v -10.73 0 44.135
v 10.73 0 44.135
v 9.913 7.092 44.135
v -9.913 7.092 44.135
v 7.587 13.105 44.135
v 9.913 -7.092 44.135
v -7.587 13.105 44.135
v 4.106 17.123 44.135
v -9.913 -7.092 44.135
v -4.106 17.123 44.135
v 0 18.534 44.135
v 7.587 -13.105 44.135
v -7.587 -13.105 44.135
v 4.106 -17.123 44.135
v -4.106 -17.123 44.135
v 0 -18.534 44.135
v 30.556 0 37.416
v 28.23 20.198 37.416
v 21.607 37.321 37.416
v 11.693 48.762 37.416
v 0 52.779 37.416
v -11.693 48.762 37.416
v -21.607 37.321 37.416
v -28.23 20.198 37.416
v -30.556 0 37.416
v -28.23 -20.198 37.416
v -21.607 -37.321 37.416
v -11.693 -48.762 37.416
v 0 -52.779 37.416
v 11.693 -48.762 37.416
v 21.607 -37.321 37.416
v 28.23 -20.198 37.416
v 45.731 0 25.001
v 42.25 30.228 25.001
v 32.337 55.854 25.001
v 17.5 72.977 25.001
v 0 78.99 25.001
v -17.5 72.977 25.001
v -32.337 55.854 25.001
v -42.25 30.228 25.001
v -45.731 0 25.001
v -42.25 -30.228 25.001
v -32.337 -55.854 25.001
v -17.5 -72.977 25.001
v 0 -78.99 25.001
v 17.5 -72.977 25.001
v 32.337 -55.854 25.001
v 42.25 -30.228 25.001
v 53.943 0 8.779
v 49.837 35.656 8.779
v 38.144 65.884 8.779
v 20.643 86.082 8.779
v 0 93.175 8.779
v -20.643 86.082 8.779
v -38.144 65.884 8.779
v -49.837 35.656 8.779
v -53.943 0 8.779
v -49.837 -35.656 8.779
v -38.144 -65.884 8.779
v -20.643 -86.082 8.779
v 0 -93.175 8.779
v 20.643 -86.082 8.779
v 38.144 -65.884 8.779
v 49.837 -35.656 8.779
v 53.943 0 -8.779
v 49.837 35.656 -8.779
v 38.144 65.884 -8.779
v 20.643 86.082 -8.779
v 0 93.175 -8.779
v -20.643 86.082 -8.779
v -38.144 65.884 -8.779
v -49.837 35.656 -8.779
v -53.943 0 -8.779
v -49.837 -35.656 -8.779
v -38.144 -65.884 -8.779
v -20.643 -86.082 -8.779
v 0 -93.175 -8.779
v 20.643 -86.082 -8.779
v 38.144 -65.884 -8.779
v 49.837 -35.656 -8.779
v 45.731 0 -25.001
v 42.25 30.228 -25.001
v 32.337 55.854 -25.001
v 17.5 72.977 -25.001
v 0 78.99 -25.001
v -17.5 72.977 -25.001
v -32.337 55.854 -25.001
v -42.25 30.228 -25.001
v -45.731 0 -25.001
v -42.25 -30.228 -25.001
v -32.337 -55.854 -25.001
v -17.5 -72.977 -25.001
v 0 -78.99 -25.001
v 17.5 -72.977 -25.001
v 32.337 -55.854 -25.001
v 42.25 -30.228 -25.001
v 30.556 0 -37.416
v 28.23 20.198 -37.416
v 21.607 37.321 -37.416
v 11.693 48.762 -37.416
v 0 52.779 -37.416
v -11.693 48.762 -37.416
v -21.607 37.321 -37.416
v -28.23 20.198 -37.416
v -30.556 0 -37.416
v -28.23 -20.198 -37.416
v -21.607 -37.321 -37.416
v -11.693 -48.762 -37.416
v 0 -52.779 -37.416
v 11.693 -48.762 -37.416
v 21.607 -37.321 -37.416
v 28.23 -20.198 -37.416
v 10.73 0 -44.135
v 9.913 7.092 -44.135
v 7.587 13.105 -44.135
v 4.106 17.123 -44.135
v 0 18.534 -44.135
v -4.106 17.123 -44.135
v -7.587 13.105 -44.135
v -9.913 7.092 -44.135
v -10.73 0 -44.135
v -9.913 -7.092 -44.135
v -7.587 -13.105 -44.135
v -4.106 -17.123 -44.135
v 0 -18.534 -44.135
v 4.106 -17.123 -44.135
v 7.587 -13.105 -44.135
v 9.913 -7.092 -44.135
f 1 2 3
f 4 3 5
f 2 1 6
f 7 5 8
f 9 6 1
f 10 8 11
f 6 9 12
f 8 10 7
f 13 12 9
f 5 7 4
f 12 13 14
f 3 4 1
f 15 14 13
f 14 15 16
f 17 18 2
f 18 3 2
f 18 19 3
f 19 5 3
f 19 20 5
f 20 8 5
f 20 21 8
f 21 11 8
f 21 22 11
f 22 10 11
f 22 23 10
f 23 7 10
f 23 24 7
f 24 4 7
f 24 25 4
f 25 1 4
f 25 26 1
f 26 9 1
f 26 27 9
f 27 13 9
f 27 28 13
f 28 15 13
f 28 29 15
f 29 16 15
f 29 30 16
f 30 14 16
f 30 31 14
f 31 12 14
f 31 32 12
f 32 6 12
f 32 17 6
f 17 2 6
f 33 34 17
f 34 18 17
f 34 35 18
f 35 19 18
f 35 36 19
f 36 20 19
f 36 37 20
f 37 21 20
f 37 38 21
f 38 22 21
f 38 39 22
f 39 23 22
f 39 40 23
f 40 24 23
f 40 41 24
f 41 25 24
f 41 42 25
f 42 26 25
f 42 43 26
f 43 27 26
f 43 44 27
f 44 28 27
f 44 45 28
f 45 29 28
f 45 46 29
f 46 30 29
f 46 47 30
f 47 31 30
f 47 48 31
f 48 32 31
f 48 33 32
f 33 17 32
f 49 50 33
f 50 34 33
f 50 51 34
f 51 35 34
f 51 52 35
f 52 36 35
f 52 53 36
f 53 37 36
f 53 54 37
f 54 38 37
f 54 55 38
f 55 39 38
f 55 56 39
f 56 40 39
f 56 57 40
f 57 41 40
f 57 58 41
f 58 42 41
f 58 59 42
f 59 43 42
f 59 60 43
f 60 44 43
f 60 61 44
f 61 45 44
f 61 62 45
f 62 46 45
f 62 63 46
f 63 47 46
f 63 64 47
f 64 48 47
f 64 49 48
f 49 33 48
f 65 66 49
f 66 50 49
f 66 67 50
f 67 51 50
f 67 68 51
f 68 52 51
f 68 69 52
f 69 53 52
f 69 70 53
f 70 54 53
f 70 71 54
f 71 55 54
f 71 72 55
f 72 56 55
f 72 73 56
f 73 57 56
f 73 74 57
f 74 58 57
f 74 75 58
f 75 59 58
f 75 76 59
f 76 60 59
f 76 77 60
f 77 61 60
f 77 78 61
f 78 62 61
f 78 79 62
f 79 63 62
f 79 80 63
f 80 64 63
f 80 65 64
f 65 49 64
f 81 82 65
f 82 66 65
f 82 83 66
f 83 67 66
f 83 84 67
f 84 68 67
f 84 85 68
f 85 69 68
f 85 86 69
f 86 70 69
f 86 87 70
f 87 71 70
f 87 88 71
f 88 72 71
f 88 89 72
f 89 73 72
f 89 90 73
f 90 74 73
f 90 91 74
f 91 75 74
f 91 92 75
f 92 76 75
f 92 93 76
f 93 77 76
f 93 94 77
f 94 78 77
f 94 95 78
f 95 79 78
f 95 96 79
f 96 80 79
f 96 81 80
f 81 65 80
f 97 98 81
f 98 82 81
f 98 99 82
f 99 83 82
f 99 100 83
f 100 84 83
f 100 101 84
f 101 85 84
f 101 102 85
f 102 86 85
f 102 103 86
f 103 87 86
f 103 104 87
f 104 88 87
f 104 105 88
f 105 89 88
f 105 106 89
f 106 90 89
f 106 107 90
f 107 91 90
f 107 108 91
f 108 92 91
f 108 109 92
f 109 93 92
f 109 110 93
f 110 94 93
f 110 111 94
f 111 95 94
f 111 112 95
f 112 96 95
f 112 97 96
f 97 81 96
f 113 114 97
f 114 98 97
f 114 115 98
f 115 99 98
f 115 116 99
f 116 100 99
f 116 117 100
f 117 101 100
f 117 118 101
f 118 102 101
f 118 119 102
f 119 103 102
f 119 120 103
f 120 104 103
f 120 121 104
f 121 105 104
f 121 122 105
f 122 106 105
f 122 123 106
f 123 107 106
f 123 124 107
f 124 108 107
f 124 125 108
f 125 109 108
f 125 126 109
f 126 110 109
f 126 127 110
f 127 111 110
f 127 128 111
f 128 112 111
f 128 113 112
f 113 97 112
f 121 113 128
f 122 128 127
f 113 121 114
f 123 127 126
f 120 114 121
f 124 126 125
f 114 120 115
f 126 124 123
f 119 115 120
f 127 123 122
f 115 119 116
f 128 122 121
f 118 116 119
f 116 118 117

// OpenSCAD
// Generated by SolidPython 1.0.1 on 2020-07-29 00:46:50


scale(v = [11, 19, 9]) {
	sphere(r = 5);
}
/***********************************************
*********      SolidPython code:      **********
************************************************
 
# import packages: SolidPython
from solid import *
from solid.utils import *
from itertools import chain, combinations, permutations


class Resize:

    def __init__(self, scad_file):
        self.scad_file = scad_file
        #self.scad_file = import_scad(scad_file)
        # cone/cylinder param:
        self.r1 = 0
        self.r2 = 0
        self.h = 0
        # rectangular prism param:
        self.w = 0
        self.l = 0
        # ellipse param:
        self.r = 0

    # import OpenScad code (file name corresponds to shape)


    # classify shape + parameters
    def assign(self, param1, param2, param3):
        if self.scad_file == 'cone.scad':
            self.r1 = param1
            self.r2 = param2
            self.h = param3
        elif self.scad_file == 'cylinder.scad':
            self.r1 = param1
            self.r2 = param2
            self.h = param3
        elif self.scad_file == 'rectangularPrism.scad':
            self.h = param1
            self.l = param2
            self.w = param3
        else:
            self.r = param1
            self.h = param2

    # resize parameters
    def iterate(self):
        x = range(3, 20, 2)
        i = 1
        if self.scad_file == 'cone.scad':
            tempList = list(permutations(x, 2))
            for temp in tempList:
                param1 = temp[0]
                param2 = temp[1]
                filepath = 'produced_scad_files/' + 'cone' + str(param1) + '_' + str(param2) + '_' + '.scad'
                scad_render_to_file(cylinder(h=param1, r1=param2, r2=0), filepath)

        elif self.scad_file == 'cylinder.scad':
            tempList = list(permutations(x, 3))
            for temp in tempList:
                param1 = temp[0]
                param2 = temp[1]
                filepath = 'produced_scad_files/' + 'cylinder' + str(param1) + '_' + str(param2) + '_' + '.scad'
                scad_render_to_file(cylinder(h=param1, r1=param2, r2=param2), filepath)

        elif self.scad_file == 'rectangularPrism.scad':
            tempList = list(permutations(x, 3))
            for temp in tempList:
                param1 = temp[0]
                param2 = temp[1]
                param3 = temp[2]
                filepath = 'produced_scad_files/' + 'rectangularPrism' + str(param1) + '_' + str(param2) + '_' + str(
                    param3) + '.scad'
                scad_render_to_file(cube(size=(param1, param2, param3)), filepath)

        elif self.scad_file == 'ellipse.scad':
            tempList = list(permutations(x, 4))
            for temp in tempList:
                param1 = temp[0]
                param2 = temp[1]
                param3 = temp[2]
                param4 = temp[3]
                filepath = 'produced_scad_files/' + 'ellipse' + str(param1) + '_' + str(param2) + '_' + str(param3) + '_' + str(param4) + '.scad'
                scad_render_to_file(scale([param1, param2, param3])(sphere(r=param4)), filepath)

    def render_to_scadfile(self):
        scad_render_to_file(scad, 'example.scad') 
 
************************************************/
